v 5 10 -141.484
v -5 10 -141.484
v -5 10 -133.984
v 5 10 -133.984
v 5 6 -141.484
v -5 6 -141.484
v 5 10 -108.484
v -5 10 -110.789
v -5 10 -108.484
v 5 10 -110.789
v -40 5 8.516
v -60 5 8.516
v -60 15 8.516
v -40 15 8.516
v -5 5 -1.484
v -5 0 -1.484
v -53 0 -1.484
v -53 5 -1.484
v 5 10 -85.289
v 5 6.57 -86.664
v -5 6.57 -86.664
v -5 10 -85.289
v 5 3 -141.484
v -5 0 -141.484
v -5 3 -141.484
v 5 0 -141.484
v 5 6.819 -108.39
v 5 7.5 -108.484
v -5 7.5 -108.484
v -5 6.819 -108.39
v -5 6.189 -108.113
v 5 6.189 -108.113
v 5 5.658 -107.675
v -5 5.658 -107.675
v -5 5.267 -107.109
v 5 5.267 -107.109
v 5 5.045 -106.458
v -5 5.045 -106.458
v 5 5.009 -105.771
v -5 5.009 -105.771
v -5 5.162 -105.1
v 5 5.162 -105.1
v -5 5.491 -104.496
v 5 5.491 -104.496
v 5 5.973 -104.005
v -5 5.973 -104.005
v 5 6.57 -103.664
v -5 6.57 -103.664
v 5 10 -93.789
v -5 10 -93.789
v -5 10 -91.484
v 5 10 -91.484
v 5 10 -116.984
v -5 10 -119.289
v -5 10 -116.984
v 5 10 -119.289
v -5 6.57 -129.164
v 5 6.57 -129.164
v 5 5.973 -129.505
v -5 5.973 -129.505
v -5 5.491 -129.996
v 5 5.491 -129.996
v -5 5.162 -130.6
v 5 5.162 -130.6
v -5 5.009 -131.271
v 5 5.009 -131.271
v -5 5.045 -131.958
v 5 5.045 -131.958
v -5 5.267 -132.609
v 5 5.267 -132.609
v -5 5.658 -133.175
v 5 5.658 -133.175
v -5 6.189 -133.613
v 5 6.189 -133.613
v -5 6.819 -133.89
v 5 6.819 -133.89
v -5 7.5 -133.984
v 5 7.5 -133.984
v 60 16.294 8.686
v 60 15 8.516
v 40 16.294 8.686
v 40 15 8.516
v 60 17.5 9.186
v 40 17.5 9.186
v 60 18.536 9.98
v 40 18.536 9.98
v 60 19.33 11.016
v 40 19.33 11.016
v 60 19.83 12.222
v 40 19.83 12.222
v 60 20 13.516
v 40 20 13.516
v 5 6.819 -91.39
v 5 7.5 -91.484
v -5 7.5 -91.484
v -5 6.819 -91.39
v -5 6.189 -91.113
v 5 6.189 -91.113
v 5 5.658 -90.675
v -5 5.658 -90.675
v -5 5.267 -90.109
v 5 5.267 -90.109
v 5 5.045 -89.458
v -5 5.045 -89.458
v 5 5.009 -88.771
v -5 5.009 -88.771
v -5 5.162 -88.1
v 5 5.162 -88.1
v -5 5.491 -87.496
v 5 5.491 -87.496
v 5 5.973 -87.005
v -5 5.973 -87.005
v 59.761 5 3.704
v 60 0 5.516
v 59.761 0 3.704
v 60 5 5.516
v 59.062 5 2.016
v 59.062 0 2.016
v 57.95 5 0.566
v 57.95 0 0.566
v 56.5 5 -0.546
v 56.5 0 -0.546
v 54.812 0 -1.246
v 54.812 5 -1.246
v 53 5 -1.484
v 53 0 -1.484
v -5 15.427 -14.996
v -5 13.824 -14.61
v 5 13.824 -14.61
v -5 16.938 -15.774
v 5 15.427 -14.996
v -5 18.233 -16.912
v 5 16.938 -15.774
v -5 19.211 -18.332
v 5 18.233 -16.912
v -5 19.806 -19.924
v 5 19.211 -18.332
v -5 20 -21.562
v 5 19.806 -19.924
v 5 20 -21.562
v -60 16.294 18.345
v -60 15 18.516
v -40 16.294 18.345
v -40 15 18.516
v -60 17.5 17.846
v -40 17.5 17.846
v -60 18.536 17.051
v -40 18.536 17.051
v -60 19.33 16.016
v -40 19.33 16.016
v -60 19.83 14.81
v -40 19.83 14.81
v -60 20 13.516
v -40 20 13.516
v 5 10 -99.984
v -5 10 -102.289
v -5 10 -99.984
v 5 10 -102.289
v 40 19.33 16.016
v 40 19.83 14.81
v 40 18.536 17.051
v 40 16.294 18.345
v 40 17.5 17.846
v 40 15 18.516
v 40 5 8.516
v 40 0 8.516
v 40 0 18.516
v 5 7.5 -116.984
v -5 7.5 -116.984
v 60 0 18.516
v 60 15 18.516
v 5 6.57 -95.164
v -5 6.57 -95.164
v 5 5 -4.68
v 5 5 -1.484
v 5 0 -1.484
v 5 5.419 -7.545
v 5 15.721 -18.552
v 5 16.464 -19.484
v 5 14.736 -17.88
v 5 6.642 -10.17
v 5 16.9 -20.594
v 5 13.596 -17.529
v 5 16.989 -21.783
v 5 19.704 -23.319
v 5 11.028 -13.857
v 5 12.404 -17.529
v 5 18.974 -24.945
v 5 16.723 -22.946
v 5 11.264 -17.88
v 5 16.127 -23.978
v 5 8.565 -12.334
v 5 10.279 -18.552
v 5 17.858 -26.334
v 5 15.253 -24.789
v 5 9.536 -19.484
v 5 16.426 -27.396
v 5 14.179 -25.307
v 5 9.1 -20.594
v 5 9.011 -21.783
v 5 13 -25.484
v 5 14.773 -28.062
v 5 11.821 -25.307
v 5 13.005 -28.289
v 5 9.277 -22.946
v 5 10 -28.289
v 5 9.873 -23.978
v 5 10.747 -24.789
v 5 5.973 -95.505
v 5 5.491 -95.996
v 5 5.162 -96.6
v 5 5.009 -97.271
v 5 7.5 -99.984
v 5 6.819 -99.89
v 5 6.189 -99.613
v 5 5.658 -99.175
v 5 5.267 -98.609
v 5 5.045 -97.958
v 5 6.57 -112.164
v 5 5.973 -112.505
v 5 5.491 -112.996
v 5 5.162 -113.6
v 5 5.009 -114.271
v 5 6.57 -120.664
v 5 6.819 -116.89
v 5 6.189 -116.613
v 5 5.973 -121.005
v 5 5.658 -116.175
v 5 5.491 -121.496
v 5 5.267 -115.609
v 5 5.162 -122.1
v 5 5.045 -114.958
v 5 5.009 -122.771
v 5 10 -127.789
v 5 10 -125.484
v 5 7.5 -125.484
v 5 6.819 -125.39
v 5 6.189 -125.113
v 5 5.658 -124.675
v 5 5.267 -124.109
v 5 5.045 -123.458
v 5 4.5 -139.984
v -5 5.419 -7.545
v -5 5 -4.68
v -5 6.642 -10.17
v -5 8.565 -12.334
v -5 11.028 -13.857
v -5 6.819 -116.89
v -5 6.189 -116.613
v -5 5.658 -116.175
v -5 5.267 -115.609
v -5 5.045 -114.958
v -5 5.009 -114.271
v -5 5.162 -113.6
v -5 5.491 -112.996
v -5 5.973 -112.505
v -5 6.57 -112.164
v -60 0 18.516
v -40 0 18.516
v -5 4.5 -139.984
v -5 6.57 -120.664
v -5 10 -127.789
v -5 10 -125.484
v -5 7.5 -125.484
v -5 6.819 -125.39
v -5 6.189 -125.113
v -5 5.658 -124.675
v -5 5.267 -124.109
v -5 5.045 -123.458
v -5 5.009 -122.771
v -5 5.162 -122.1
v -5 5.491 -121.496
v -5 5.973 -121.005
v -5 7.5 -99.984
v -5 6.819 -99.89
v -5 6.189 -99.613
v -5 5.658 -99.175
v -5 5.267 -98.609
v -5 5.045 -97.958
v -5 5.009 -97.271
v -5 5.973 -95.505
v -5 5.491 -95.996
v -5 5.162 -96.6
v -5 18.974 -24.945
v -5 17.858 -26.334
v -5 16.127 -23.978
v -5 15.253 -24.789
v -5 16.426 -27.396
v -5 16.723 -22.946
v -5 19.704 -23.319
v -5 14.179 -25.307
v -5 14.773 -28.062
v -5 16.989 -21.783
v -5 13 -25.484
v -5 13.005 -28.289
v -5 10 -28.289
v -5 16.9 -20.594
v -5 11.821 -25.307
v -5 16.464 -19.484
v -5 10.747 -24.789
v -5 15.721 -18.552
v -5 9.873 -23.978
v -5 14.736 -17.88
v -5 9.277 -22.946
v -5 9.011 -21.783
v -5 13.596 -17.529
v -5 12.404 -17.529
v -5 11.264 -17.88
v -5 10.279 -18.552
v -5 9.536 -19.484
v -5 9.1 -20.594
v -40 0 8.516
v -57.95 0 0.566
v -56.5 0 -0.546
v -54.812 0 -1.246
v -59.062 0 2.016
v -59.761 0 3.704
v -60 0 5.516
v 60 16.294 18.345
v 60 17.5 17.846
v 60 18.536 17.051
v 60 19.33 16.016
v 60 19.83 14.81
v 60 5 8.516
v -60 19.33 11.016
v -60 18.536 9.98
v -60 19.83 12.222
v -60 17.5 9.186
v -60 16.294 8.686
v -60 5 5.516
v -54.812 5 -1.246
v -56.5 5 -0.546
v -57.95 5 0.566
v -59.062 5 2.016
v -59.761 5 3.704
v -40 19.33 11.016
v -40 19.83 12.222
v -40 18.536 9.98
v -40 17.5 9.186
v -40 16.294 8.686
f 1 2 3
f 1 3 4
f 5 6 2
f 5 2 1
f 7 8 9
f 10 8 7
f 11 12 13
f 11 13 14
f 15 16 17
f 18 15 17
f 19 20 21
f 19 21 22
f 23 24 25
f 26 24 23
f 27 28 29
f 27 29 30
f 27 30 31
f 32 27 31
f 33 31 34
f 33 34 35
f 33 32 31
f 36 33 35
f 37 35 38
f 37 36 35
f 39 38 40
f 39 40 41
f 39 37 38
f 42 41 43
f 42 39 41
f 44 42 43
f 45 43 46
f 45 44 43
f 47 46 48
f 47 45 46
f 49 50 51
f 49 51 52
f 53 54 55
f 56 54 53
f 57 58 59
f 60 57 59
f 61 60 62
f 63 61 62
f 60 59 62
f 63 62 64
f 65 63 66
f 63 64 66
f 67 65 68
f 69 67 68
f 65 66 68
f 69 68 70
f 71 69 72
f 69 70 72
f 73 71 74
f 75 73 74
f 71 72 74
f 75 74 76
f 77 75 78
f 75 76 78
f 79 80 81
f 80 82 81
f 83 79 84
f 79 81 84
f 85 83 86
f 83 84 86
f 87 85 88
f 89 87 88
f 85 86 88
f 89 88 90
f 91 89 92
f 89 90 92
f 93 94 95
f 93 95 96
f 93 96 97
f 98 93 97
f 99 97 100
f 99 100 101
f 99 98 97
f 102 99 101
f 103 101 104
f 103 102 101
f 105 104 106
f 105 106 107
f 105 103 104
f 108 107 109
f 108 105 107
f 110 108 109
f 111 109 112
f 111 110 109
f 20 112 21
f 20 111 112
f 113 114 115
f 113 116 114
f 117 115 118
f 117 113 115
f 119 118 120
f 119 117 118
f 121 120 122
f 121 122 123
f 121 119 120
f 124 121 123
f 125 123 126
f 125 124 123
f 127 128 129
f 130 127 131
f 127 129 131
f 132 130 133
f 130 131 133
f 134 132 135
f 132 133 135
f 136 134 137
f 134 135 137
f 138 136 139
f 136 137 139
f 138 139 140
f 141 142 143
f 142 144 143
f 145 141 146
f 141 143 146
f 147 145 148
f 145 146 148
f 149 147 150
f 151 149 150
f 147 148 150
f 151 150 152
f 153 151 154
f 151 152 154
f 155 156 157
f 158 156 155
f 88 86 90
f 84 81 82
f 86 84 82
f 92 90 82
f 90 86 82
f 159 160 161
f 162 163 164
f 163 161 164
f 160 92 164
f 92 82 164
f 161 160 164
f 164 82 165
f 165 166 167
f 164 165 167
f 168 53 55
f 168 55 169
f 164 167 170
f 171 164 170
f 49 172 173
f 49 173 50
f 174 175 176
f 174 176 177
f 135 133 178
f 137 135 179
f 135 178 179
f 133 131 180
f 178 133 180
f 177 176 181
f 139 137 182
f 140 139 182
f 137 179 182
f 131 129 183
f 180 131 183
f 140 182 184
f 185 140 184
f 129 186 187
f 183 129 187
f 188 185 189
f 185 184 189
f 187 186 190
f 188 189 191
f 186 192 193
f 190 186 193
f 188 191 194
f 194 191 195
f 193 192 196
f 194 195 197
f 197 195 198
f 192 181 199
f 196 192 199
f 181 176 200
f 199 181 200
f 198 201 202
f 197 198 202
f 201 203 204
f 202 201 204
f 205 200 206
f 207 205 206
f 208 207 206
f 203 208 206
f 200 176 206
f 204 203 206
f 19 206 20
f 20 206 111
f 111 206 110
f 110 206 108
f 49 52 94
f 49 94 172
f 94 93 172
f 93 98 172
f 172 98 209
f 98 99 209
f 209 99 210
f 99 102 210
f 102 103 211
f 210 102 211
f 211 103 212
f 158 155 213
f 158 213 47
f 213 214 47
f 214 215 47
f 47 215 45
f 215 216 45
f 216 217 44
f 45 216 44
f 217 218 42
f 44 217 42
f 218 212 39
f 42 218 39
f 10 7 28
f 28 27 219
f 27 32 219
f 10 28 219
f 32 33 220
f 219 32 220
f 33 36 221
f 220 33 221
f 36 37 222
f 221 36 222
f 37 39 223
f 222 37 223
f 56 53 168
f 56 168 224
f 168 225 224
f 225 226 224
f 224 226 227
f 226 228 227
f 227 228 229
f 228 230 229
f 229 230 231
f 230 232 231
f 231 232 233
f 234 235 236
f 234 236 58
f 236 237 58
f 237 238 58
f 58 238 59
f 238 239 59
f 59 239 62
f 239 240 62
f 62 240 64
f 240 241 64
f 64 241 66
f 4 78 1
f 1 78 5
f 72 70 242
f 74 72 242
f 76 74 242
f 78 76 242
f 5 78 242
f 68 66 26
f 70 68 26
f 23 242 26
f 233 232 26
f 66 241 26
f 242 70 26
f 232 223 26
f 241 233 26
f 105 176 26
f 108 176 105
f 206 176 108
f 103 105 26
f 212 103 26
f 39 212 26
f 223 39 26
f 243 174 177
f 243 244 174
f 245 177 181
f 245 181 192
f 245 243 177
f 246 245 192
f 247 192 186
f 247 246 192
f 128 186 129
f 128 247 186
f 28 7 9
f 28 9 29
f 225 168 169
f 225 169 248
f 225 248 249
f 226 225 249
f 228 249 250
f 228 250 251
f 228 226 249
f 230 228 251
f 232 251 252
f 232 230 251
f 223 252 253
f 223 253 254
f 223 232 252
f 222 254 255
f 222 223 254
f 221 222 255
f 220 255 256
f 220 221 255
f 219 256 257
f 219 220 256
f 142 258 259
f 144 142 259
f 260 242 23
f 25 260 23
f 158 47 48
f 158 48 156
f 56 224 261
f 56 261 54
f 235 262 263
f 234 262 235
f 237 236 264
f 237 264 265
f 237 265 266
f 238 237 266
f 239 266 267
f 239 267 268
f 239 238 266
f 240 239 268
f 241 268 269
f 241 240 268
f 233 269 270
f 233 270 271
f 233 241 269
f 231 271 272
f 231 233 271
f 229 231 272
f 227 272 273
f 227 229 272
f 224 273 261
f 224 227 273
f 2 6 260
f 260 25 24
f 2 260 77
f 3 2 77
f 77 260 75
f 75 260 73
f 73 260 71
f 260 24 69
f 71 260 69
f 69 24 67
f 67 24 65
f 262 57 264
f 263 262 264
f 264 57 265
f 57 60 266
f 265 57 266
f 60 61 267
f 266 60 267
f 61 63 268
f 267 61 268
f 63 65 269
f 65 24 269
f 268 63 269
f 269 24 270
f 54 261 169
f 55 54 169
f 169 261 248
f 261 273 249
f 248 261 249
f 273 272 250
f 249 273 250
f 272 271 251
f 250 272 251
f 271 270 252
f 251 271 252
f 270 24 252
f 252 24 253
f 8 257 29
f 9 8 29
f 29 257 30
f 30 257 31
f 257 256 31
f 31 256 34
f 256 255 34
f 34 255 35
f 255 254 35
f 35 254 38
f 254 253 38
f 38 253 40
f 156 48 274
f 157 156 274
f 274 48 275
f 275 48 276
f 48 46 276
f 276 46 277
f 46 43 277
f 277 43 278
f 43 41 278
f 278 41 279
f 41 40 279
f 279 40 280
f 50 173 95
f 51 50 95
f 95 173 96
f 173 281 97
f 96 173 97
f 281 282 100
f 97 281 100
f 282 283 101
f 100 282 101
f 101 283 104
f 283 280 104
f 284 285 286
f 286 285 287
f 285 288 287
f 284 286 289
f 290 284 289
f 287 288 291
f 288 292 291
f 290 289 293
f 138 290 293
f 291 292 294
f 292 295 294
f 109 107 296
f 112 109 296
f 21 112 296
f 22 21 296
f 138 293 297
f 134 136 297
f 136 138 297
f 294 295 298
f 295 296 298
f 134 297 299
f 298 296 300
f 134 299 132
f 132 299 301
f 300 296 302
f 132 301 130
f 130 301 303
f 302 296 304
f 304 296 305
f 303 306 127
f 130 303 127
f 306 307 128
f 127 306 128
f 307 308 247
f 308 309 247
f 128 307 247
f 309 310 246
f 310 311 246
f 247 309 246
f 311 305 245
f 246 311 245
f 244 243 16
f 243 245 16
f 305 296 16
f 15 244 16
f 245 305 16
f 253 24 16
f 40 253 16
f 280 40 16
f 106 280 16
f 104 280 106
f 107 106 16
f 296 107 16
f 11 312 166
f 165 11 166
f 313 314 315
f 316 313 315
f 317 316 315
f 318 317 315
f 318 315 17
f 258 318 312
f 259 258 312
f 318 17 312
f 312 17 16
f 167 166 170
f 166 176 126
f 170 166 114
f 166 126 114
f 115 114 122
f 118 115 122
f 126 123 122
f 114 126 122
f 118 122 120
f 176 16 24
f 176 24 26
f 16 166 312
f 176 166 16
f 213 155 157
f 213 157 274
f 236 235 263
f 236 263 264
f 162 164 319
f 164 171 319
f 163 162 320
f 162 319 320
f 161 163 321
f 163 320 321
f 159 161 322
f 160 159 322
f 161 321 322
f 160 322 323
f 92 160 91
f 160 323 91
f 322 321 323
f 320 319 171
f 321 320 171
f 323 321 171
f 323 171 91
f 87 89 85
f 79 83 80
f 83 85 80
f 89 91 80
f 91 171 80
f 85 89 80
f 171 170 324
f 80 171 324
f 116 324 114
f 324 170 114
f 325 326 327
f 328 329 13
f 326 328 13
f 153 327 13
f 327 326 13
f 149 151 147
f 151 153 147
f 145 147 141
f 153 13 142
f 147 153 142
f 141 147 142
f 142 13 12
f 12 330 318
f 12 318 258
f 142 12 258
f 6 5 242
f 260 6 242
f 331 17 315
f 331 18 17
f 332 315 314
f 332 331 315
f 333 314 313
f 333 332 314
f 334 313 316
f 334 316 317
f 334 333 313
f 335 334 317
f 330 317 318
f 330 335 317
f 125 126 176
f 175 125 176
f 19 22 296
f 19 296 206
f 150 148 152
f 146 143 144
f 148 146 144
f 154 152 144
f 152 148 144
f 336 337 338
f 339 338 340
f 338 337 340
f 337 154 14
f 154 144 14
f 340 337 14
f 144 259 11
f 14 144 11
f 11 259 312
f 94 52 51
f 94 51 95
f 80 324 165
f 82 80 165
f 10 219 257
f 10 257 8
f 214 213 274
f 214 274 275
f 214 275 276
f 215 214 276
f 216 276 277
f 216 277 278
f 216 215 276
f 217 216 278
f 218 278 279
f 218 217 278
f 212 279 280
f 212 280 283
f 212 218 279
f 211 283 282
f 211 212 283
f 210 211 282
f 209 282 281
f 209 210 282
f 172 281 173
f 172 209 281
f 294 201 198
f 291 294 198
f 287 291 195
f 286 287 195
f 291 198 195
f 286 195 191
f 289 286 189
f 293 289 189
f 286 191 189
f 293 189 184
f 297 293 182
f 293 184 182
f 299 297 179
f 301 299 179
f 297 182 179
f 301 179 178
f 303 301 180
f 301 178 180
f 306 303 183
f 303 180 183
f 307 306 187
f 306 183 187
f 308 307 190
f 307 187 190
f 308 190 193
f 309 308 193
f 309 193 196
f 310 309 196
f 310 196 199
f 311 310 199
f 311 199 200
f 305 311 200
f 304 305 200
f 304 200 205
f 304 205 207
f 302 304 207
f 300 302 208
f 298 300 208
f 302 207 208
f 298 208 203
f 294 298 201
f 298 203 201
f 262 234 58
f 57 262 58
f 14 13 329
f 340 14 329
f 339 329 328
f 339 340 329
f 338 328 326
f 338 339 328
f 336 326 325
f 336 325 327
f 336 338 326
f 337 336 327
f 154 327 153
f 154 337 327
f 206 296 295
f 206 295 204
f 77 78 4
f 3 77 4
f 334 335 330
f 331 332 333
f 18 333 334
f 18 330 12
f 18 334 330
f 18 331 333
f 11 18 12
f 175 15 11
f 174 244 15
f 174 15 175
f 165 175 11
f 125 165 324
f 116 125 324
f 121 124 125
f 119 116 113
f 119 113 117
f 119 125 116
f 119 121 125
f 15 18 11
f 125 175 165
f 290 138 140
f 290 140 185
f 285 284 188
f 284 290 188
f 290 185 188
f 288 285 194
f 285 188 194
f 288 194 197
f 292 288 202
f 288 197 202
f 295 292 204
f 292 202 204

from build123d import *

# Parameters (mm, degrees)
SKETCH1_W           = 20
SKETCH1_H           = 10
SKETCH1_W_2         = 10
SKETCH1_H_2         = 13.195504549
SKETCH1_H_3         = 13.608990902
SKETCH1_H_4         = 113.195504549
BOSS_EXTRUDE1_DEPTH = 5
SKETCH1_3_W         = 20
SKETCH1_3_H         = 10
SKETCH1_3_W_2       = 10
SKETCH1_3_H_2       = 13.608990902
BOSS_EXTRUDE2_DEPTH = 20
SKETCH1_5_W         = 10
SKETCH1_5_H         = 113.195504549
BOSS_EXTRUDE3_DEPTH = 10
SKETCH3_R           = 4
CUT_EXTRUDE1_DEPTH  = 10
FILLET1_R           = 10
FILLET2_R           = 5
FILLET3_R           = 7
FILLET4_R           = 7
FILLET5_R           = 7


# Some blends are built 0.0001 mm under size
with BuildPart() as part:
    # Sketch1 → Boss-Extrude1 (new body)
    with BuildSketch(Plane(origin=(0, 0, 0), x_dir=(1, 0, 0), z_dir=(0, 1, 0))):
        Polygon((60, -8.515763432), (44.667493795, -8.515763432), (40, -8.515763432), (40, -18.515763432), (60, -18.515763432), align=None)
        Polygon((40, -8.515763432), (44.667493795, -8.515763432), (60, -8.515763432), (60, 1.484236568), (5, 1.484236568), (-5, 1.484236568), (-60, 1.484236568), (-60, -8.515763432), (-40, -8.515763432), align=None)
        with Locations((-50, -13.515763432)):
            Rectangle(SKETCH1_W, SKETCH1_H)
        with Locations((0, 8.081988842)):
            Rectangle(SKETCH1_W_2, SKETCH1_H_2)
        with Locations((0, 21.484236568)):
            Rectangle(SKETCH1_W_2, SKETCH1_H_3)
        with Locations((0, 84.886484294)):
            Rectangle(SKETCH1_W_2, SKETCH1_H_4)
    extrude(amount=BOSS_EXTRUDE1_DEPTH)

    # Sketch1<3> → Boss-Extrude2 (add)
    with BuildSketch(Plane(origin=(0, 0, 0), x_dir=(1, 0, 0), z_dir=(0, 1, 0))):
        with Locations((-50, -13.515763432)):
            Rectangle(SKETCH1_3_W, SKETCH1_3_H)
        Polygon((60, -8.515763432), (44.667493795, -8.515763432), (40, -8.515763432), (40, -18.515763432), (60, -18.515763432), align=None)
        with Locations((0, 21.484236568)):
            Rectangle(SKETCH1_3_W_2, SKETCH1_3_H_2)
    extrude(amount=BOSS_EXTRUDE2_DEPTH)

    # Sketch1<5> → Boss-Extrude3 (add)
    with BuildSketch(Plane(origin=(0, 0, 0), x_dir=(1, 0, 0), z_dir=(0, 1, 0))):
        with Locations((0, 84.886484294)):
            Rectangle(SKETCH1_5_W, SKETCH1_5_H)
    extrude(amount=BOSS_EXTRUDE3_DEPTH)

    # Sketch3 → Cut-Extrude1 (cut)
    with BuildSketch(Plane(origin=(5, 0, 0), x_dir=(0, 0, -1), z_dir=(1, 0, 0))):
        with Locations((21.484236568, 13)):
            Circle(SKETCH3_R)
        with BuildLine():
            Line((120.663634314, 6.570050981), (119.289130035, 10))
            Line((119.289130035, 10), (125.484236568, 10))
            Line((125.484236568, 10), (125.484236568, 7.5))
            ThreePointArc((125.484236568, 7.5), (123.457784012, 5.045259114), (120.663634314, 6.570050981))
        make_face()
        with BuildLine():
            Line((133.984236568, 7.5), (133.984236568, 10))
            Line((133.984236568, 10), (127.789130035, 10))
            Line((127.789130035, 10), (129.163634314, 6.570050981))
            ThreePointArc((129.163634314, 6.570050981), (131.957784012, 5.045259114), (133.984236568, 7.5))
        make_face()
        Polygon((141.484236568, 6), (139.984236568, 4.5), (141.484236568, 3), align=None)
        with BuildLine():
            Line((112.163634314, 6.570050981), (110.789130035, 10))
            Line((110.789130035, 10), (116.984236568, 10))
            Line((116.984236568, 10), (116.984236568, 7.5))
            ThreePointArc((116.984236568, 7.5), (114.957784012, 5.045259114), (112.163634314, 6.570050981))
        make_face()
        with BuildLine():
            Line((103.663634314, 6.570050981), (102.289130035, 10))
            Line((102.289130035, 10), (108.484236568, 10))
            Line((108.484236568, 10), (108.484236568, 7.5))
            ThreePointArc((108.484236568, 7.5), (106.457784012, 5.045259114), (103.663634314, 6.570050981))
        make_face()
        with BuildLine():
            Line((95.163634314, 6.570050981), (93.789130035, 10))
            Line((93.789130035, 10), (99.984236568, 10))
            Line((99.984236568, 10), (99.984236568, 7.5))
            ThreePointArc((99.984236568, 7.5), (97.957784012, 5.045259114), (95.163634314, 6.570050981))
        make_face()
        with BuildLine():
            Line((86.663634314, 6.570050981), (85.289130035, 10))
            Line((85.289130035, 10), (91.484236568, 10))
            Line((91.484236568, 10), (91.484236568, 7.5))
            ThreePointArc((91.484236568, 7.5), (89.457784012, 5.045259114), (86.663634314, 6.570050981))
        make_face()
    extrude(amount=-CUT_EXTRUDE1_DEPTH, mode=Mode.SUBTRACT)

    # Fillet1
    fillet1_edges = [part.edges().sort_by_distance(p)[0] for p in [
        (0, 5, -14.679741117),
    ]]
    fillet(fillet1_edges, radius=FILLET1_R)

    # Fillet2
    fillet2_edges = [part.edges().sort_by_distance(p)[0] for p in [
        (-50, 20, 8.515763432),
        (-50, 20, 18.515763432),
        (50, 20, 8.515763432),
        (50, 20, 18.515763432),
    ]]
    fillet(fillet2_edges, radius=FILLET2_R - 0.0001)  # a hair under: the kernel refuses the full size

    # Fillet3
    fillet3_edges = [part.edges().sort_by_distance(p)[0] for p in [
        (0, 20, -14.679741117),
    ]]
    fillet(fillet3_edges, radius=FILLET3_R)

    # Fillet4
    # the kernel refuses this fillet: 7 mm, written as the material it takes off along each edge
    with BuildSketch(Plane(origin=(22.486690858, 20, -28.288732019), x_dir=(0, 0, 1), z_dir=(-1, 0, 0))) as fillet4_piece_1:
        with BuildLine():
            CenterArc((7, -6.994676343), FILLET4_R, 92.234709992, 87.765290008)
            Line((0, -6.994676343), (-0.14, -6.994676343))
            Line((-0.14, -6.994676343), (-0.14, 0))
            Line((-0.14, 0), (0, 0.14))
            ThreePointArc((0, 0.14), (3.363523943, 0.14), (6.721588844, 0.139893527))
            Line((6.721588844, 0.139893527), (6.727047886, 0))
        make_face()
    extrude(amount=44.973381715, mode=Mode.SUBTRACT)

    # Fillet5
    fillet5_edges = [part.edges().sort_by_distance(p)[0] for p in [
        (-60, 2.5, -1.484236568),
        (60, 2.5, -1.484236568),
    ]]
    fillet(fillet5_edges, radius=FILLET5_R)


solid = part.part
